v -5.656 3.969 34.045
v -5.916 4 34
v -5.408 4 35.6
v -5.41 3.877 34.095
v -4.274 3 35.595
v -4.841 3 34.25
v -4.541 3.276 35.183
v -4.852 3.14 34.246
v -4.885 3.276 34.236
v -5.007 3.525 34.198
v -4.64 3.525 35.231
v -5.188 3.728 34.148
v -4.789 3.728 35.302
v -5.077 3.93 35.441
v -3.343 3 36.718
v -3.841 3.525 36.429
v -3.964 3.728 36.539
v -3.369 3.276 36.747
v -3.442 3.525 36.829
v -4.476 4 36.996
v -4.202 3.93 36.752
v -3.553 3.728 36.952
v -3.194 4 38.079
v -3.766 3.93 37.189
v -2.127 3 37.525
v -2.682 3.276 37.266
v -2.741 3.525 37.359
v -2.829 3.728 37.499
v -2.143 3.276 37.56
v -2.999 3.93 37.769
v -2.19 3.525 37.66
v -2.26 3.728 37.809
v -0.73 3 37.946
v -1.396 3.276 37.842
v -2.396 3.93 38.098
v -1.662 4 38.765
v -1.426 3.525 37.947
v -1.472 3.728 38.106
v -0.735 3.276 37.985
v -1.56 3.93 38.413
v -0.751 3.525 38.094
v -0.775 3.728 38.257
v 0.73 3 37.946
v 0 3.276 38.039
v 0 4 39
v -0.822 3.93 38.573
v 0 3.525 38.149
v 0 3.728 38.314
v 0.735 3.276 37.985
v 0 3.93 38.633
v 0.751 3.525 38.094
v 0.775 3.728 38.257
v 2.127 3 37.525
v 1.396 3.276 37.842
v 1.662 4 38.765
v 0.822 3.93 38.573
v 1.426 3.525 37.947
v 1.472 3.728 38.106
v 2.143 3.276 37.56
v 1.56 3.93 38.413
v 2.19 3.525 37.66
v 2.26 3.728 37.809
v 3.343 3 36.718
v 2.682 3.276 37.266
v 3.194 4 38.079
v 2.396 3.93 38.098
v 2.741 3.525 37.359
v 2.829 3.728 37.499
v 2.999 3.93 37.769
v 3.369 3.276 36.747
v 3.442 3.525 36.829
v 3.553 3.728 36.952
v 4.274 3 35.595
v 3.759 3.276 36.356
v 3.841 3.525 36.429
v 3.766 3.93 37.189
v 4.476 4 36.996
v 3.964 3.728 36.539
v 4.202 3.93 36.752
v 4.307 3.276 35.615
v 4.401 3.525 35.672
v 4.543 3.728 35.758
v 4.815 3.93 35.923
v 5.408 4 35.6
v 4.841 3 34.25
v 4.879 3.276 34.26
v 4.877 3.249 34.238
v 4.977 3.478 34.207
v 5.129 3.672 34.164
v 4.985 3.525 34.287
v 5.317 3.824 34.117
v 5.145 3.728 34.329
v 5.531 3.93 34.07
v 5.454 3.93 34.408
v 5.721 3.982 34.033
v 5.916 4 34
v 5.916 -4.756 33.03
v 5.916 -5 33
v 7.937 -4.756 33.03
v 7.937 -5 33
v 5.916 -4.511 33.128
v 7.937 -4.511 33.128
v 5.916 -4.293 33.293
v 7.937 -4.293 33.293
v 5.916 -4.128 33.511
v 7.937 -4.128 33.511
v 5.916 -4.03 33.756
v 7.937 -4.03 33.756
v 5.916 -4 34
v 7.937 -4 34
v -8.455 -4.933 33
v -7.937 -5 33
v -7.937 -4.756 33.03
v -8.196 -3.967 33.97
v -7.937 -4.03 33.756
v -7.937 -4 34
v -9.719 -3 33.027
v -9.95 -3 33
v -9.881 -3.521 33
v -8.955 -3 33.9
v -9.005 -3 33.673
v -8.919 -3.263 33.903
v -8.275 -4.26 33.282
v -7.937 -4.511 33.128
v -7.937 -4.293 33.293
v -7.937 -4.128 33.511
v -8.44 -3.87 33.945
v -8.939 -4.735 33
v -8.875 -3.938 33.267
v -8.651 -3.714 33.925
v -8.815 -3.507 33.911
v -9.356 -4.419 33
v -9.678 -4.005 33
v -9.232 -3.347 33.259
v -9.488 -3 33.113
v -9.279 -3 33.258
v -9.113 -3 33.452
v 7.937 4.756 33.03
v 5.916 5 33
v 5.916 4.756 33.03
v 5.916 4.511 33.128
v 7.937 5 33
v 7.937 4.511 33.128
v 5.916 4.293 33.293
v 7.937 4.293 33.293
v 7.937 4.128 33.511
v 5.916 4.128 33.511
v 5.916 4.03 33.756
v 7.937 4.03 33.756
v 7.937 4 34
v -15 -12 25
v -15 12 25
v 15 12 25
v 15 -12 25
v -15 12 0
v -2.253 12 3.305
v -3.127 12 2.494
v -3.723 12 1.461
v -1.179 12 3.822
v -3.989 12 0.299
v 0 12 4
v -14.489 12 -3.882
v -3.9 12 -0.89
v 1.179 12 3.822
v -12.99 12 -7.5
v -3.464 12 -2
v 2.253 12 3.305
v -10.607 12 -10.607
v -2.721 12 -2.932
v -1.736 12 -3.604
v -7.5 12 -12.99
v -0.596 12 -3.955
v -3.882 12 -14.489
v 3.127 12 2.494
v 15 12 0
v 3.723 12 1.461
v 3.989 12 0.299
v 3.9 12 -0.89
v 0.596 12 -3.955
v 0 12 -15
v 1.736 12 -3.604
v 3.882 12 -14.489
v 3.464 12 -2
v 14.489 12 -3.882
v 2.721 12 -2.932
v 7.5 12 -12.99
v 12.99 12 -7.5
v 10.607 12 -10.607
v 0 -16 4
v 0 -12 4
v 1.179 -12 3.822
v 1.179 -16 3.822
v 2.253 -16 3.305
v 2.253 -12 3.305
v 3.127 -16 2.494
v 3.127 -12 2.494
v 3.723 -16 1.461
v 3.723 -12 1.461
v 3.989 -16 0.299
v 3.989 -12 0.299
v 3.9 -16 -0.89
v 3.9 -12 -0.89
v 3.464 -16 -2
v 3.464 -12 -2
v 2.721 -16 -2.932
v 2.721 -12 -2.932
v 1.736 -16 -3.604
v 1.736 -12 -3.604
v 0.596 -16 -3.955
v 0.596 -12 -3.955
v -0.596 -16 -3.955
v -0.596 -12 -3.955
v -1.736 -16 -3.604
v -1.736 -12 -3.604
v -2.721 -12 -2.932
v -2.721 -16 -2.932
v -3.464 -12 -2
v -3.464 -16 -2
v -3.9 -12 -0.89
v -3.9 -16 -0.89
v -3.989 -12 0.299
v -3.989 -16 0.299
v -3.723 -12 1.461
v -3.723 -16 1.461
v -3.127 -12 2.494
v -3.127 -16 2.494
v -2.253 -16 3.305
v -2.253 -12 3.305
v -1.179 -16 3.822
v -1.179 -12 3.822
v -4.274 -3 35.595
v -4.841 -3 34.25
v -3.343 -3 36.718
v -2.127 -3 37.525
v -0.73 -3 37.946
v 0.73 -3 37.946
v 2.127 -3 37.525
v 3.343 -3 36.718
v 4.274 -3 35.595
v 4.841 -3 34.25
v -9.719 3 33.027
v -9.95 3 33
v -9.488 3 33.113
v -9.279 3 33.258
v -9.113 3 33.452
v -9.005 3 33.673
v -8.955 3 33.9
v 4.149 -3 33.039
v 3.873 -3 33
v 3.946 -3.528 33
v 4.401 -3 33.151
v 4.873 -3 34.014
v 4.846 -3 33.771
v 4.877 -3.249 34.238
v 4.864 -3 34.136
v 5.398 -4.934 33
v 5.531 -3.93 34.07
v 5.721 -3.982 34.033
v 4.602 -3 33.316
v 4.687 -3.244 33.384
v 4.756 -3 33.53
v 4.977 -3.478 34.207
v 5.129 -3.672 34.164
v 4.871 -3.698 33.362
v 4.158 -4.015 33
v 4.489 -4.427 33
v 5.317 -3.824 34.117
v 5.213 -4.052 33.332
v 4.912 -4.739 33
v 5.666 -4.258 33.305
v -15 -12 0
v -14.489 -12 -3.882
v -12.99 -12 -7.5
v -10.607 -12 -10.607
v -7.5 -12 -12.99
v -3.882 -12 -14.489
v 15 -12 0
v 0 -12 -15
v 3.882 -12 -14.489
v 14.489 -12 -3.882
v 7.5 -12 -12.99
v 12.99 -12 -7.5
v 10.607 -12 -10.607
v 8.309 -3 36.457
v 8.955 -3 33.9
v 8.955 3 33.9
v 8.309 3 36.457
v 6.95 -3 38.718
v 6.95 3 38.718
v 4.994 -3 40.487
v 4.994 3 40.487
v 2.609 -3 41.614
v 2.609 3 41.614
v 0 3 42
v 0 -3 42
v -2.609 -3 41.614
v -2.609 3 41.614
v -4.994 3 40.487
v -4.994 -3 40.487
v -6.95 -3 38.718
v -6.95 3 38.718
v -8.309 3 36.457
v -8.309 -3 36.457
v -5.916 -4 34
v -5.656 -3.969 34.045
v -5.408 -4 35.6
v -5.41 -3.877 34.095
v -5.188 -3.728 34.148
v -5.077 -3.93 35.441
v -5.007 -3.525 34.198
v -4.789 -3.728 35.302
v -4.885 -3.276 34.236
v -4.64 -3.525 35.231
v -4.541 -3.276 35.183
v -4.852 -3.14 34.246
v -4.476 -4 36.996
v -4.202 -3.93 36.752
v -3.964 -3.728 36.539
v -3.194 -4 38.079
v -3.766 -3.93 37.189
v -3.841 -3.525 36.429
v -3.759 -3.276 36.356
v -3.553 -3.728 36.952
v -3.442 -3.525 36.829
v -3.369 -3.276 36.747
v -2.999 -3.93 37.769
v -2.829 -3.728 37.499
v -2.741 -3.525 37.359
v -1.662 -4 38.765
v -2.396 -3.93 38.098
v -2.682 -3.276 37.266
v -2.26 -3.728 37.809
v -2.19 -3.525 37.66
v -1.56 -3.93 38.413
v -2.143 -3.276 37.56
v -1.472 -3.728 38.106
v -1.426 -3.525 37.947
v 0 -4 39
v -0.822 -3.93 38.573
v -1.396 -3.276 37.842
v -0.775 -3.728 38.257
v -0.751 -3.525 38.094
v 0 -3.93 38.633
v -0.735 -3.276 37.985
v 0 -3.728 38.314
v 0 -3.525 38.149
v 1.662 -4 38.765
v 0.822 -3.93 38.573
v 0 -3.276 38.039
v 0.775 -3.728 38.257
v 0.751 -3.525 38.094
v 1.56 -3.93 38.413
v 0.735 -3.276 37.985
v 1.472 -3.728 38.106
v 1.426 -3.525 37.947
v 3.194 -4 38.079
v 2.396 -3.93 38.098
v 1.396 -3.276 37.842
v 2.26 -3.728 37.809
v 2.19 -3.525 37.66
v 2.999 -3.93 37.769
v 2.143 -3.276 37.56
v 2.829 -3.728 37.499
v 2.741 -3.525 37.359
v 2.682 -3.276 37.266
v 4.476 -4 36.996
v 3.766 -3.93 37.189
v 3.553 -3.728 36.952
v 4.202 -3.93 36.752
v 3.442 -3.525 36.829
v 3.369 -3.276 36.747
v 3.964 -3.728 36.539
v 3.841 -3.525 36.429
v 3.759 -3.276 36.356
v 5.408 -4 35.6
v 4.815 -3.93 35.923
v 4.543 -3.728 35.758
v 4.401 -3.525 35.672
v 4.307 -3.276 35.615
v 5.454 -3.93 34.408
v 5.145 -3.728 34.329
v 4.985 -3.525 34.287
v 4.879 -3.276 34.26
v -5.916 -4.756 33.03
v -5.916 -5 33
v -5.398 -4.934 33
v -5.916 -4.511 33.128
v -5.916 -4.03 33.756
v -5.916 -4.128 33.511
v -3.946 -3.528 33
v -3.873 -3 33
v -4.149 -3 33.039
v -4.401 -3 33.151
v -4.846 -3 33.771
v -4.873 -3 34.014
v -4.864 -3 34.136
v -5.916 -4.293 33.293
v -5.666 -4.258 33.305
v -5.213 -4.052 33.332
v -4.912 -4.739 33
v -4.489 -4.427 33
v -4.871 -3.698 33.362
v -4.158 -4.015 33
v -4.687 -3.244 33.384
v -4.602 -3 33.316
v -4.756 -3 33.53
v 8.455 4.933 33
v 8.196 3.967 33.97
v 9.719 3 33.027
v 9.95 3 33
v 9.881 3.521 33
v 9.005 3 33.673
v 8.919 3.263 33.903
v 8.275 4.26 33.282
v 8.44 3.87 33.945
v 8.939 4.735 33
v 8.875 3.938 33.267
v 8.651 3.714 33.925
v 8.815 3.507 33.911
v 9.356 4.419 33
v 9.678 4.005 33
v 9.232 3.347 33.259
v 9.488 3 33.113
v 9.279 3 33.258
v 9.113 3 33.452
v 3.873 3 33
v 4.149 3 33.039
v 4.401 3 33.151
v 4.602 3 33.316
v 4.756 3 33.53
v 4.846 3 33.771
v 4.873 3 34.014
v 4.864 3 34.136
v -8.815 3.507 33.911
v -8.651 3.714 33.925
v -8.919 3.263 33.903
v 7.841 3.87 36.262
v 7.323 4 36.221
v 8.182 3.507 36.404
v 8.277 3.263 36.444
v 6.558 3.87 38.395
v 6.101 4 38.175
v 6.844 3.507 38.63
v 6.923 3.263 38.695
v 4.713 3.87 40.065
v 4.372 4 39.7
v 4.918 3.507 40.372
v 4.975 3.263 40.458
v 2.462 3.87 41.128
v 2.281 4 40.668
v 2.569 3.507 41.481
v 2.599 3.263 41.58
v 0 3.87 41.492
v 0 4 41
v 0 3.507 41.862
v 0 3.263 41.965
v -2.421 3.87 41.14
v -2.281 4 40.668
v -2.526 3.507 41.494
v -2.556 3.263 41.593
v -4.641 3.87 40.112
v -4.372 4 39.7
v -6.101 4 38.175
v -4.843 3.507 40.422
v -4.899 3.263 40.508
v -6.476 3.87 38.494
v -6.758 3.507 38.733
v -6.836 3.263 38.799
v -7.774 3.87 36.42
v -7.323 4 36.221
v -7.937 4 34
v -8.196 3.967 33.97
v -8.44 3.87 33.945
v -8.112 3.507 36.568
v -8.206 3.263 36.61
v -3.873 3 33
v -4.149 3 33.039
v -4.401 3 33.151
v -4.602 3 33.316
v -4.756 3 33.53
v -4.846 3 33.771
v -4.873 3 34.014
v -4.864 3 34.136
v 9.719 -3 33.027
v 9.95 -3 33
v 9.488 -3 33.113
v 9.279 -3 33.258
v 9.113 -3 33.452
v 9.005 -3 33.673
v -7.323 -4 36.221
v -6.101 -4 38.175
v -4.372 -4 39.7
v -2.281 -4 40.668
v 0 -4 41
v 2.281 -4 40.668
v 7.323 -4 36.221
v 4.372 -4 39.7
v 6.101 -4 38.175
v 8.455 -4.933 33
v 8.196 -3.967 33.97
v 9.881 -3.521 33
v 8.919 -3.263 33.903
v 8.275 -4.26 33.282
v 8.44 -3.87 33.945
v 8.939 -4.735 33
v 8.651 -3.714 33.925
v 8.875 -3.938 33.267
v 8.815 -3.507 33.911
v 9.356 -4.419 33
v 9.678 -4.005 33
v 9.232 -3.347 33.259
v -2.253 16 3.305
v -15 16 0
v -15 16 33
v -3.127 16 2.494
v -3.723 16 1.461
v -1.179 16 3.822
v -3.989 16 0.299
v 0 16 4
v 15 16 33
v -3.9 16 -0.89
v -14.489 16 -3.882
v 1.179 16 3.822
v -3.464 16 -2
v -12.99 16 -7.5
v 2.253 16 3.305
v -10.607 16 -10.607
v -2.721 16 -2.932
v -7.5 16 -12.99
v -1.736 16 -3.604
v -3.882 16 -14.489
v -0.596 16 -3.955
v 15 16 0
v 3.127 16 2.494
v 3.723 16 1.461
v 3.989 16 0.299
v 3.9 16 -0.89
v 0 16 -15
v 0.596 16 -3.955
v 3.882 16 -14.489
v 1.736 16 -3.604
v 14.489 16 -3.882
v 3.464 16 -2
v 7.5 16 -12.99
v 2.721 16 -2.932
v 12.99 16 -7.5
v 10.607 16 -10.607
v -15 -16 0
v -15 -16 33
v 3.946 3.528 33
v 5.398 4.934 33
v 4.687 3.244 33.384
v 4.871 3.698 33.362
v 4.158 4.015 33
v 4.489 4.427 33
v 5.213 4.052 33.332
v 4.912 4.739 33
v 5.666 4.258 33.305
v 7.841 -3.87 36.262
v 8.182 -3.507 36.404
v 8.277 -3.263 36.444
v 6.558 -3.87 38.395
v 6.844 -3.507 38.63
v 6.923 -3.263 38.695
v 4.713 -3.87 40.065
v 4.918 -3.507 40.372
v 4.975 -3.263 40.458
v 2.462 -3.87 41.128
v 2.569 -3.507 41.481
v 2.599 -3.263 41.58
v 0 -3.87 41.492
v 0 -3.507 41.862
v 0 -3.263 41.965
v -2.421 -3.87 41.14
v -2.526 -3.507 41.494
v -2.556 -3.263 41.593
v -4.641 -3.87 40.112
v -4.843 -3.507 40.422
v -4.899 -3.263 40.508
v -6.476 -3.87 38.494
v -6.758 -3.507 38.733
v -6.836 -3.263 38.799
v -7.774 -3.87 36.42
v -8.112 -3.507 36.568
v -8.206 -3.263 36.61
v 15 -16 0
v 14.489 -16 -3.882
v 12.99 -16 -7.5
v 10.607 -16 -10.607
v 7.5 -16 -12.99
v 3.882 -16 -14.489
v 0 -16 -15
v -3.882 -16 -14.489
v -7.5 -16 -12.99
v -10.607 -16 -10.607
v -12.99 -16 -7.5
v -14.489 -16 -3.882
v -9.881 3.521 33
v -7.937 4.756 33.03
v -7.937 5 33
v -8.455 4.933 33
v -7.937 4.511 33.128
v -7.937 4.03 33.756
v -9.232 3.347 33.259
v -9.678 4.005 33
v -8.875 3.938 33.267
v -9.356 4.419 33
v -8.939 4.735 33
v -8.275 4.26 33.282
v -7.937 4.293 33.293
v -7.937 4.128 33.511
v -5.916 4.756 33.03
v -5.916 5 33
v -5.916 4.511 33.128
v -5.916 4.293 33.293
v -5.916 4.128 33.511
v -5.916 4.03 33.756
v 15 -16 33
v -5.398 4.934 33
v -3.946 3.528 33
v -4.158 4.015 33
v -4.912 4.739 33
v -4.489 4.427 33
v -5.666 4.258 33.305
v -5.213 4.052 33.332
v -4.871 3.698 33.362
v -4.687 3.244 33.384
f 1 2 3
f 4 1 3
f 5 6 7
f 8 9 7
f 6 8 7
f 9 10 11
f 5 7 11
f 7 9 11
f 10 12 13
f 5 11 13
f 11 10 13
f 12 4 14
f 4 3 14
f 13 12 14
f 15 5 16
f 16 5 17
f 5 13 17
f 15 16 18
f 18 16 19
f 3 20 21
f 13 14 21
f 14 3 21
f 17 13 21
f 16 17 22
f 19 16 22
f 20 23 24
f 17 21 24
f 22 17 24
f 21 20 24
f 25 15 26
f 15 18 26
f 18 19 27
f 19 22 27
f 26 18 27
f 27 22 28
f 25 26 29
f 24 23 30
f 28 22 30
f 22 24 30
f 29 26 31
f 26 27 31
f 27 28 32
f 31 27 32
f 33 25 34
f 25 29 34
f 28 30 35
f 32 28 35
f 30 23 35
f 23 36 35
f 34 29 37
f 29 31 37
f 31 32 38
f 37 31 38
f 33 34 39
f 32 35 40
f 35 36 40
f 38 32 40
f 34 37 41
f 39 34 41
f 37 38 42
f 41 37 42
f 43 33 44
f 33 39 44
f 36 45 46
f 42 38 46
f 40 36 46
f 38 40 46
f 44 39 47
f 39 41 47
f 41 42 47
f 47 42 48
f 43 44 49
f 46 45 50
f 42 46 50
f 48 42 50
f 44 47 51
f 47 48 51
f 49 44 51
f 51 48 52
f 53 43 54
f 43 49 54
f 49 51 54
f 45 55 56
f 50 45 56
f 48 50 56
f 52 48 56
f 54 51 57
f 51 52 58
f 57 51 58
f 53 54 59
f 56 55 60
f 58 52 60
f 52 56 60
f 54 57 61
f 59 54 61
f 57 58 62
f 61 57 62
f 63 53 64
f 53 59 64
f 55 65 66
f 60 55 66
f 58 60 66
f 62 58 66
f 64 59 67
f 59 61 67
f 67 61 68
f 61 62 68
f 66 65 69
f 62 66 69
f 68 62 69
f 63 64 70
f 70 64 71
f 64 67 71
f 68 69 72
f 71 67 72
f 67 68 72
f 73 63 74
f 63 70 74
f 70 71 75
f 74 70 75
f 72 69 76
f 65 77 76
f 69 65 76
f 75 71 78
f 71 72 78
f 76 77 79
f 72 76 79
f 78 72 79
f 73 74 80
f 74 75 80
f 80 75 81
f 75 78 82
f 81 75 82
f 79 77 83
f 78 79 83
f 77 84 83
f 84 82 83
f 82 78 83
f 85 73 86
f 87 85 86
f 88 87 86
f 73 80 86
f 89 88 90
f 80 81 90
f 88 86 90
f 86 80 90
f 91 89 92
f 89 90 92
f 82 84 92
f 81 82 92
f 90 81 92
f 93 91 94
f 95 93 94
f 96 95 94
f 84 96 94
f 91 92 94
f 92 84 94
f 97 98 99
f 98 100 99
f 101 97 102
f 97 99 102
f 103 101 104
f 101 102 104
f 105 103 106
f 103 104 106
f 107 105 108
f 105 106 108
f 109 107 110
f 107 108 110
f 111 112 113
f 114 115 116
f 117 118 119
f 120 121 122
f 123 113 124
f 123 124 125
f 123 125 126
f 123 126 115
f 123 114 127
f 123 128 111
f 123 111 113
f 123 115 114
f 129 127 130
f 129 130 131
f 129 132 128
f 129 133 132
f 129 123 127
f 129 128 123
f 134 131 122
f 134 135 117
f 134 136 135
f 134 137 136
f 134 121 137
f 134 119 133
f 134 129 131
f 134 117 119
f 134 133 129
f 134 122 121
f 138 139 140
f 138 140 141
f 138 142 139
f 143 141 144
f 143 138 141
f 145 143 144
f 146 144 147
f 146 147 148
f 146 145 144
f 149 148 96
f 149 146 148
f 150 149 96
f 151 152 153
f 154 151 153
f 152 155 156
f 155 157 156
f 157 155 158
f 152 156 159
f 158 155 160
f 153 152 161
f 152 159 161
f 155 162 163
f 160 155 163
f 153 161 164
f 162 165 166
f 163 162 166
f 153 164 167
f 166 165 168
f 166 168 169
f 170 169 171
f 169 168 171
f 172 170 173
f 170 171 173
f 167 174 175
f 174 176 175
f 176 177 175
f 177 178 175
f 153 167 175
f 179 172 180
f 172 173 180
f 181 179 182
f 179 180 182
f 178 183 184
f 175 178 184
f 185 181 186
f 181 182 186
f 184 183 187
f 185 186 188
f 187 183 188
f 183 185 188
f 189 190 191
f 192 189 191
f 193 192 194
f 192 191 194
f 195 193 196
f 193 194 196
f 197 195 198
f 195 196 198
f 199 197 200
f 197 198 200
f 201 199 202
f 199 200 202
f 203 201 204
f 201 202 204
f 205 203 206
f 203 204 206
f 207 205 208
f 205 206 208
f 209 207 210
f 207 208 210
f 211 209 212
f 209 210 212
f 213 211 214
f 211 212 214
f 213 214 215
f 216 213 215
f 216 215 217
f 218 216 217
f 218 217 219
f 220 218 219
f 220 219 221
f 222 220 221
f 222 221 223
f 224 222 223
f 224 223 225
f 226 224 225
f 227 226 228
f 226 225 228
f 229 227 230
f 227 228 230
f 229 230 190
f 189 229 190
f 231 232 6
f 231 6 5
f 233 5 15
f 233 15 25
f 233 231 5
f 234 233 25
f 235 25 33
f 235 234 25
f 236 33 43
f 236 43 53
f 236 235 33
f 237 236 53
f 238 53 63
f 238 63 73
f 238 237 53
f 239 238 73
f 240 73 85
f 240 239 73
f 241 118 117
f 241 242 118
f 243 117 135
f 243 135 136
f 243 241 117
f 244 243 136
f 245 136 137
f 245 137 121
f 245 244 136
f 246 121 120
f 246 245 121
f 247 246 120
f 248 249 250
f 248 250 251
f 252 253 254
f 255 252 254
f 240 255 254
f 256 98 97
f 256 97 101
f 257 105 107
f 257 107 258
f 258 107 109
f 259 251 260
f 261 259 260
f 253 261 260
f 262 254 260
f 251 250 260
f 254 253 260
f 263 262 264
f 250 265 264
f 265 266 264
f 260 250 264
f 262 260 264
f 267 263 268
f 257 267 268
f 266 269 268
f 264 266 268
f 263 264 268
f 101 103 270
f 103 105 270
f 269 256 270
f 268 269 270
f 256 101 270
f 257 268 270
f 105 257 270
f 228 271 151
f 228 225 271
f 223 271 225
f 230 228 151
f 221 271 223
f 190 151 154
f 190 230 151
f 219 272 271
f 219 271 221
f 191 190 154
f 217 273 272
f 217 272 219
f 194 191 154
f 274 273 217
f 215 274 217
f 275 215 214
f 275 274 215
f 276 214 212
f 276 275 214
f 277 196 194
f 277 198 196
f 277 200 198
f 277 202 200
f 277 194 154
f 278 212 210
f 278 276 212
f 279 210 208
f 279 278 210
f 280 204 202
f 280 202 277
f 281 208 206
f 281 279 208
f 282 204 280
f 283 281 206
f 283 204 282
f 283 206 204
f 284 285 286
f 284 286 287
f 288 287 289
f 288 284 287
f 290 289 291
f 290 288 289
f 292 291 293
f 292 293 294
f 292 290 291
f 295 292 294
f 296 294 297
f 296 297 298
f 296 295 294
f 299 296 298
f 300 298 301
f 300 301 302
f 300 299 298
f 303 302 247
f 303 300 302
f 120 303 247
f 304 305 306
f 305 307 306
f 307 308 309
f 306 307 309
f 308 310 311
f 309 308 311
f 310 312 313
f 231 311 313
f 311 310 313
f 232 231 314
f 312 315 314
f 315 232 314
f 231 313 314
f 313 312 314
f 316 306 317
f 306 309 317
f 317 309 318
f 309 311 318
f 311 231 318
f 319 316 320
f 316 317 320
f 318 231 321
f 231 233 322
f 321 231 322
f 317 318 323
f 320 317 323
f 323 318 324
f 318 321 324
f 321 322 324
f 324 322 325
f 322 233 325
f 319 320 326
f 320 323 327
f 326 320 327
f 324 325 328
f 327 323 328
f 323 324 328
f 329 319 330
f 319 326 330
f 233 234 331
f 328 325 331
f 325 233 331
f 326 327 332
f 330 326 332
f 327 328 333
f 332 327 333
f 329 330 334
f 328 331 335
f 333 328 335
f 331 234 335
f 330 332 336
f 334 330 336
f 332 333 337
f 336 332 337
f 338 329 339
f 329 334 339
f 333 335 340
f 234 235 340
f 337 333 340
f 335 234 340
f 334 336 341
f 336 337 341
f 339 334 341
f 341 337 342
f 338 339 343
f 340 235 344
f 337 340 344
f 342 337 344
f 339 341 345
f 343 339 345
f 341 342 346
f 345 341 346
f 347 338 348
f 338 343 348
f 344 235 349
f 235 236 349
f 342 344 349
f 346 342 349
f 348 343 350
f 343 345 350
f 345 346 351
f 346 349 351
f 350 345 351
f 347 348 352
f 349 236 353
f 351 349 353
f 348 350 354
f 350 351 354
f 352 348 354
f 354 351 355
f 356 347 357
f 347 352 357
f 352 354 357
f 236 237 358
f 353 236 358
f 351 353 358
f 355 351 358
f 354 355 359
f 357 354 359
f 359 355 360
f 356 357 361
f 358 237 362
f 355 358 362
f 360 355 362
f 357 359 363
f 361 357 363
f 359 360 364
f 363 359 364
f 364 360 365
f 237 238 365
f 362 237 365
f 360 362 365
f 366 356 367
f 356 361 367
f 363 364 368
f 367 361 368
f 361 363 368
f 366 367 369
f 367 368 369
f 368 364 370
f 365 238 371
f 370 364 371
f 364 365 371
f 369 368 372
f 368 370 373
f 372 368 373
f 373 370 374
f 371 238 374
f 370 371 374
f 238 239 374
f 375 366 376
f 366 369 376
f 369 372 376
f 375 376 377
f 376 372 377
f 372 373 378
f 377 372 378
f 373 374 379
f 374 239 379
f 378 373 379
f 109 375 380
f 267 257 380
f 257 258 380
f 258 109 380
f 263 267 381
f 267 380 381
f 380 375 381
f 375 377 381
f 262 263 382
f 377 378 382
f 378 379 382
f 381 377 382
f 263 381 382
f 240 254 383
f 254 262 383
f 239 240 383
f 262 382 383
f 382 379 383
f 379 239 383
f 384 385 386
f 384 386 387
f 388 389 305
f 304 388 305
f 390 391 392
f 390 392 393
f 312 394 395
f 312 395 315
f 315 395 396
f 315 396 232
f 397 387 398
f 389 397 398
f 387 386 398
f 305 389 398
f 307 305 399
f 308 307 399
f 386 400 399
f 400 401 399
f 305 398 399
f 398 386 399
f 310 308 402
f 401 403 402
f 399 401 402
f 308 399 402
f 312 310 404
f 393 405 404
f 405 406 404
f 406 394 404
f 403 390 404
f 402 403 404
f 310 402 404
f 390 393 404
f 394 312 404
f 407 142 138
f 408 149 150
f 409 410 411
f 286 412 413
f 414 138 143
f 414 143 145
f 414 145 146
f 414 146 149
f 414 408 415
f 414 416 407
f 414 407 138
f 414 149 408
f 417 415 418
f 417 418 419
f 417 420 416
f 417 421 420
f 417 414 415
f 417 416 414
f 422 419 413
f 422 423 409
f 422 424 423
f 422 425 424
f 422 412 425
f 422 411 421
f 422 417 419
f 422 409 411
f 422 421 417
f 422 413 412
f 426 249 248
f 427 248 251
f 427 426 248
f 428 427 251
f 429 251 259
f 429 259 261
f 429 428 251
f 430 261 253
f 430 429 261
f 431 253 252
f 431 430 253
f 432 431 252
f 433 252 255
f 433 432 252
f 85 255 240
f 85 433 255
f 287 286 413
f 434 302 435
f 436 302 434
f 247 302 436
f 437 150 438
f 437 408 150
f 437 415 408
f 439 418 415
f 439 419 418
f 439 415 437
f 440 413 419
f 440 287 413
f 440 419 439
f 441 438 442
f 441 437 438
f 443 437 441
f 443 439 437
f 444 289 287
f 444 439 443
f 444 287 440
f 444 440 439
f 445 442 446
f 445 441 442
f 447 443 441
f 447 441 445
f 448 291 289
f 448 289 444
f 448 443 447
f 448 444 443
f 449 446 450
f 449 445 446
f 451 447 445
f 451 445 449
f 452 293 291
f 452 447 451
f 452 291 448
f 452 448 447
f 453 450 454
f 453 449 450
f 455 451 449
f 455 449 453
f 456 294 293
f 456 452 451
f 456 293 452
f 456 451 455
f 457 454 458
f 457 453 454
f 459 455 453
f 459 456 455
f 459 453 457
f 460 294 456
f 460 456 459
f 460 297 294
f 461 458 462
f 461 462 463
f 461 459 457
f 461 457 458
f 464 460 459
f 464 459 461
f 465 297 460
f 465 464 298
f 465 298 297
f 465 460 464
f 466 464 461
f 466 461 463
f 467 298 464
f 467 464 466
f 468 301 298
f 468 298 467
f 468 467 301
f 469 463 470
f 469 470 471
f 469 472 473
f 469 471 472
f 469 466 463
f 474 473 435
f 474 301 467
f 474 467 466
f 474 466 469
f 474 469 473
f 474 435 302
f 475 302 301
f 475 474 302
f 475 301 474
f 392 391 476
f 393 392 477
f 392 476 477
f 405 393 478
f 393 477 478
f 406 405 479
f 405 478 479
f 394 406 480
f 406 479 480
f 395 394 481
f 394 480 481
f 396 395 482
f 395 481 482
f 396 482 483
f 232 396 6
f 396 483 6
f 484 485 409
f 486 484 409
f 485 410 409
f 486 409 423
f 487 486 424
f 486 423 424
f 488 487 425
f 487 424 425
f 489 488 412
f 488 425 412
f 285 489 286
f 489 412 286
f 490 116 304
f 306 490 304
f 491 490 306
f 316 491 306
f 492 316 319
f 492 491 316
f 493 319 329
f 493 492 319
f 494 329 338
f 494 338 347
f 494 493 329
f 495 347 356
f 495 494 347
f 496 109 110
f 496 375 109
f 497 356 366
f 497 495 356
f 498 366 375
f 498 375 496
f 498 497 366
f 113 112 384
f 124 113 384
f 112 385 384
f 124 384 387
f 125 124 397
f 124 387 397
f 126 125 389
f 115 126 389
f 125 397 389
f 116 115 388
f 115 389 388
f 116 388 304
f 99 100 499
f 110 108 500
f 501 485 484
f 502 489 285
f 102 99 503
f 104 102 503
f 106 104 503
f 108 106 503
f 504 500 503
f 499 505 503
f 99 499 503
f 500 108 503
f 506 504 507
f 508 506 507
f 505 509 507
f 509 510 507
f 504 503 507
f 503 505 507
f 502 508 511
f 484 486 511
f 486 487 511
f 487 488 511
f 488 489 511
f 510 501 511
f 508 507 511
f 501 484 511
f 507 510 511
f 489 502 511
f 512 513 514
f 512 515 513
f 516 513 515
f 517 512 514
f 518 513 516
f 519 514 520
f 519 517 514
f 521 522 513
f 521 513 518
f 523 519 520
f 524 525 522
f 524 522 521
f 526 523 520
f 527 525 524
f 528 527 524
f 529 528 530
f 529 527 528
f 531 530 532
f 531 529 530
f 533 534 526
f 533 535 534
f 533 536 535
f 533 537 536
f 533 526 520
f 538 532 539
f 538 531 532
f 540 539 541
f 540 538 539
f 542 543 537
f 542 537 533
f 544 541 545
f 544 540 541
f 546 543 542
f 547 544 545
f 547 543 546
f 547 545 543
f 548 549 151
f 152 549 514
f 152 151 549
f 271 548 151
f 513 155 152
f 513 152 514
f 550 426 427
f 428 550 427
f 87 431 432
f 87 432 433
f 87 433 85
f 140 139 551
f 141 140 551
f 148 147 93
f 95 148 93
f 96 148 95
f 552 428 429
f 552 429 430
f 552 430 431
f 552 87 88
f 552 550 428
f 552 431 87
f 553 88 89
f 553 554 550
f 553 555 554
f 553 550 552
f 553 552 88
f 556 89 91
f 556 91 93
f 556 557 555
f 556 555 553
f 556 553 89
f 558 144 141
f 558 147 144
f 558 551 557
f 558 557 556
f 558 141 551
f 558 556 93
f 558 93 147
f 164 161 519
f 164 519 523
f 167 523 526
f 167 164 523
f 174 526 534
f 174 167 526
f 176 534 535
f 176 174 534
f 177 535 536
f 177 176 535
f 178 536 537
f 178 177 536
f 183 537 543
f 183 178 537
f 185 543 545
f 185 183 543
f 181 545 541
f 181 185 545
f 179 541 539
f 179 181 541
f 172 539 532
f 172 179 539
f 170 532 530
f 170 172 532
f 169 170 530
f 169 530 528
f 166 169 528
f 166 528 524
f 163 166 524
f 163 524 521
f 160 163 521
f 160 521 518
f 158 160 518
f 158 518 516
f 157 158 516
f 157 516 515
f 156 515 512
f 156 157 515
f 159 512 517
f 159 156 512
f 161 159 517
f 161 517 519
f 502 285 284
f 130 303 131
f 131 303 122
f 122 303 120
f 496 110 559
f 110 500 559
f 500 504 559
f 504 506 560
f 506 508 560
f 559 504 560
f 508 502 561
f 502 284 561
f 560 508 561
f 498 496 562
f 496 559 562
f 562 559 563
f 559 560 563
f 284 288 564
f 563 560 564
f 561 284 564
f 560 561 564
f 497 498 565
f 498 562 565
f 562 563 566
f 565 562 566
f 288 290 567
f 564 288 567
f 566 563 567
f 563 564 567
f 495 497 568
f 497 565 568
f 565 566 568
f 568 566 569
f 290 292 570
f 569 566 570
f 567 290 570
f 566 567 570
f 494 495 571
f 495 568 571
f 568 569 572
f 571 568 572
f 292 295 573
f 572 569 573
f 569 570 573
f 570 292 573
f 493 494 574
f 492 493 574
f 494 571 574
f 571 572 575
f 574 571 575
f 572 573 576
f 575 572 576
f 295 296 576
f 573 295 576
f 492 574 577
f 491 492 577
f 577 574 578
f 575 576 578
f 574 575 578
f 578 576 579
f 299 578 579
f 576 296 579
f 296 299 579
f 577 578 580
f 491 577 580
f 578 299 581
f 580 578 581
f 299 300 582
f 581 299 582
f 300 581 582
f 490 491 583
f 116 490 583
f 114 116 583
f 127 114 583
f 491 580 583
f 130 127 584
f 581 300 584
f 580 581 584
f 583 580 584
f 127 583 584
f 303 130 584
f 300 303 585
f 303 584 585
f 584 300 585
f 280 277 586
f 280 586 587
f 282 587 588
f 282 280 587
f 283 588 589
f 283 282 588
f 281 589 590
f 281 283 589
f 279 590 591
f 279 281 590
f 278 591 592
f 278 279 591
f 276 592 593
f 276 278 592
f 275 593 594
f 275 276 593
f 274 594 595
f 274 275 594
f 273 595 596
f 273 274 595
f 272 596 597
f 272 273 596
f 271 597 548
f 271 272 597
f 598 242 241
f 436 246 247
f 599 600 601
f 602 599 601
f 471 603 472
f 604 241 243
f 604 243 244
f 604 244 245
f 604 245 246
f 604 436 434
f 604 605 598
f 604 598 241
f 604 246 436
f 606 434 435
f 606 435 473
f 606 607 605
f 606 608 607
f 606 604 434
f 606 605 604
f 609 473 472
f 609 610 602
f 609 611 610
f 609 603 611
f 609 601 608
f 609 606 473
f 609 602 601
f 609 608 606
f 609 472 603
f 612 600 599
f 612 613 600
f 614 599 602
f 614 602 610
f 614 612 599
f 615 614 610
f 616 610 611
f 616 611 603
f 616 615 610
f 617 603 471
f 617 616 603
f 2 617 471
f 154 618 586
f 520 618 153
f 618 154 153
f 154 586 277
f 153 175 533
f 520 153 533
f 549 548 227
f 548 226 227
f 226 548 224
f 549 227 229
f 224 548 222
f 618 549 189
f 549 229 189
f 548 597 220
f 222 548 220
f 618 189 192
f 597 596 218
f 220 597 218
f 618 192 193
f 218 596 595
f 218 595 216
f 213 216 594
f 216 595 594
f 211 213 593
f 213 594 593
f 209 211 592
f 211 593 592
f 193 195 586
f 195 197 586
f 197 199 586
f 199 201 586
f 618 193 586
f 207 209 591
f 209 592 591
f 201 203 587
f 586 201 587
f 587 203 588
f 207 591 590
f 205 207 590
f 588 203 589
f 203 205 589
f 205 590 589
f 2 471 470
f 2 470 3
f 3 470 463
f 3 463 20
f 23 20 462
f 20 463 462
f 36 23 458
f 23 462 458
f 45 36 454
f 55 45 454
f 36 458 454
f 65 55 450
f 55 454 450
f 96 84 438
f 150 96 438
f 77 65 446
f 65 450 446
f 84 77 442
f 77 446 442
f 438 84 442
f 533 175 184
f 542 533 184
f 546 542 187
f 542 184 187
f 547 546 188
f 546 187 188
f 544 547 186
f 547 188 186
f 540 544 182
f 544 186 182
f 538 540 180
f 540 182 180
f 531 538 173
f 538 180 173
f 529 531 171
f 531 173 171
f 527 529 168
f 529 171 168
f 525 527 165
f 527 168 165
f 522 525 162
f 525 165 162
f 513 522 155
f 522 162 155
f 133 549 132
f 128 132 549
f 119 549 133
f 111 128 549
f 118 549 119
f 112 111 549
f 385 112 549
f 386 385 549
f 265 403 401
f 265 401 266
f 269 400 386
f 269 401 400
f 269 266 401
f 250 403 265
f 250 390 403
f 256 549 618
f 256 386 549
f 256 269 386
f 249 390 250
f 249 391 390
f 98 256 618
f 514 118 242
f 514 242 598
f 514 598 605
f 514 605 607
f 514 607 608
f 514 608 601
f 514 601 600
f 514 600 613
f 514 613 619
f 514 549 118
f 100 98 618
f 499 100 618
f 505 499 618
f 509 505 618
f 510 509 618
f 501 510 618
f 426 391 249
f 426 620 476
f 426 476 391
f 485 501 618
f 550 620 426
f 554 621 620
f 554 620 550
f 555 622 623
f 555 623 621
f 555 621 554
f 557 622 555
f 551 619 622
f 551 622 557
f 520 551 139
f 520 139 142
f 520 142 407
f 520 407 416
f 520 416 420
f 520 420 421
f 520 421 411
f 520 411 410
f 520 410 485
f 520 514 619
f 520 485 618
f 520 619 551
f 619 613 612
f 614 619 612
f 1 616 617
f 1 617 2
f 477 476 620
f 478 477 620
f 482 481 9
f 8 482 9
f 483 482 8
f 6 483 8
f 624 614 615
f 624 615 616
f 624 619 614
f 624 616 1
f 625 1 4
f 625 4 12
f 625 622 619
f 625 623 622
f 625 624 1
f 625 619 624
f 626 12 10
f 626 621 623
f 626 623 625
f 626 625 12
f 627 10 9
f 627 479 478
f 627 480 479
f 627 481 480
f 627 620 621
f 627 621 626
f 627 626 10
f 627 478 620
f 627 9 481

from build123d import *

# Parameters (mm, degrees)
BOSS_EXTRUDE1_START = 12
SKETCH1_R           = 4
BOSS_EXTRUDE1_DEPTH = 4
BOSS_EXTRUDE2_START = -12
SKETCH1_2_R         = 4
BOSS_EXTRUDE2_DEPTH = 4
SKETCH2_W           = 30
SKETCH2_H           = 32
BOSS_EXTRUDE3_DEPTH = 8
BOSS_EXTRUDE4_START = -12
BOSS_EXTRUDE4_DEPTH = 8
FILLET1_R           = 1


with BuildPart() as part:
    # Sketch1 → Boss-Extrude1 (new body)
    with BuildSketch(Plane(origin=(0, 0, 0), x_dir=(1, 0, 0), z_dir=(0, 1, 0)).offset(BOSS_EXTRUDE1_START)):
        with BuildLine():
            Line((-15, 0), (-15, -25))
            Line((-15, -25), (15, -25))
            Line((15, -25), (15, 0))
            ThreePointArc((15, 0), (0, 15), (-15, 0))
        make_face()
        Circle(SKETCH1_R, mode=Mode.SUBTRACT)
    extrude(amount=BOSS_EXTRUDE1_DEPTH)



with BuildPart() as body_2:
    # Sketch1<2> → Boss-Extrude2 (new body)
    with BuildSketch(Plane(origin=(0, 0, 0), x_dir=(1, 0, 0), z_dir=(0, 1, 0)).offset(BOSS_EXTRUDE2_START)):
        with BuildLine():
            Line((-15, 0), (-15, -25))
            Line((-15, -25), (15, -25))
            Line((15, -25), (15, 0))
            ThreePointArc((15, 0), (0, 15), (-15, 0))
        make_face()
        Circle(SKETCH1_2_R, mode=Mode.SUBTRACT)
    extrude(amount=-BOSS_EXTRUDE2_DEPTH)


with BuildPart() as part_1:
    add(part.part)

    add(body_2.part)  # Boss-Extrude3 merges body 2
    # Sketch2 → Boss-Extrude3 (add)
    with BuildSketch(Plane.XY.offset(25)):
        Rectangle(SKETCH2_W, SKETCH2_H)
    extrude(amount=BOSS_EXTRUDE3_DEPTH)

    # Sketch3 → Boss-Extrude4 (add)
    with BuildSketch(Plane.XZ.offset(16).offset(BOSS_EXTRUDE4_START)):
        with BuildLine():
            ThreePointArc((9, 33), (0, 42), (-9, 33))
            Line((-9, 33), (-5, 33))
            ThreePointArc((-5, 33), (0, 38), (5, 33))
            Line((5, 33), (9, 33))
        make_face()
    extrude(amount=-BOSS_EXTRUDE4_DEPTH)

    # Fillet1
    fillet1_edges = [part_1.edges().sort_by_distance(p)[0] for p in [
        (-9, 0, 33),
        (0, 4, 42),
        (9, 0, 33),
        (0, -4, 42),
        (0, -4, 38),
        (0, 4, 38),
        (-7, -4, 33),
        (-7, 4, 33),
        (7, 4, 33),
        (7, -4, 33),
        (5, 0, 33),
        (-5, 0, 33),
    ]]
    fillet(fillet1_edges, radius=FILLET1_R)


solid = part_1.part
